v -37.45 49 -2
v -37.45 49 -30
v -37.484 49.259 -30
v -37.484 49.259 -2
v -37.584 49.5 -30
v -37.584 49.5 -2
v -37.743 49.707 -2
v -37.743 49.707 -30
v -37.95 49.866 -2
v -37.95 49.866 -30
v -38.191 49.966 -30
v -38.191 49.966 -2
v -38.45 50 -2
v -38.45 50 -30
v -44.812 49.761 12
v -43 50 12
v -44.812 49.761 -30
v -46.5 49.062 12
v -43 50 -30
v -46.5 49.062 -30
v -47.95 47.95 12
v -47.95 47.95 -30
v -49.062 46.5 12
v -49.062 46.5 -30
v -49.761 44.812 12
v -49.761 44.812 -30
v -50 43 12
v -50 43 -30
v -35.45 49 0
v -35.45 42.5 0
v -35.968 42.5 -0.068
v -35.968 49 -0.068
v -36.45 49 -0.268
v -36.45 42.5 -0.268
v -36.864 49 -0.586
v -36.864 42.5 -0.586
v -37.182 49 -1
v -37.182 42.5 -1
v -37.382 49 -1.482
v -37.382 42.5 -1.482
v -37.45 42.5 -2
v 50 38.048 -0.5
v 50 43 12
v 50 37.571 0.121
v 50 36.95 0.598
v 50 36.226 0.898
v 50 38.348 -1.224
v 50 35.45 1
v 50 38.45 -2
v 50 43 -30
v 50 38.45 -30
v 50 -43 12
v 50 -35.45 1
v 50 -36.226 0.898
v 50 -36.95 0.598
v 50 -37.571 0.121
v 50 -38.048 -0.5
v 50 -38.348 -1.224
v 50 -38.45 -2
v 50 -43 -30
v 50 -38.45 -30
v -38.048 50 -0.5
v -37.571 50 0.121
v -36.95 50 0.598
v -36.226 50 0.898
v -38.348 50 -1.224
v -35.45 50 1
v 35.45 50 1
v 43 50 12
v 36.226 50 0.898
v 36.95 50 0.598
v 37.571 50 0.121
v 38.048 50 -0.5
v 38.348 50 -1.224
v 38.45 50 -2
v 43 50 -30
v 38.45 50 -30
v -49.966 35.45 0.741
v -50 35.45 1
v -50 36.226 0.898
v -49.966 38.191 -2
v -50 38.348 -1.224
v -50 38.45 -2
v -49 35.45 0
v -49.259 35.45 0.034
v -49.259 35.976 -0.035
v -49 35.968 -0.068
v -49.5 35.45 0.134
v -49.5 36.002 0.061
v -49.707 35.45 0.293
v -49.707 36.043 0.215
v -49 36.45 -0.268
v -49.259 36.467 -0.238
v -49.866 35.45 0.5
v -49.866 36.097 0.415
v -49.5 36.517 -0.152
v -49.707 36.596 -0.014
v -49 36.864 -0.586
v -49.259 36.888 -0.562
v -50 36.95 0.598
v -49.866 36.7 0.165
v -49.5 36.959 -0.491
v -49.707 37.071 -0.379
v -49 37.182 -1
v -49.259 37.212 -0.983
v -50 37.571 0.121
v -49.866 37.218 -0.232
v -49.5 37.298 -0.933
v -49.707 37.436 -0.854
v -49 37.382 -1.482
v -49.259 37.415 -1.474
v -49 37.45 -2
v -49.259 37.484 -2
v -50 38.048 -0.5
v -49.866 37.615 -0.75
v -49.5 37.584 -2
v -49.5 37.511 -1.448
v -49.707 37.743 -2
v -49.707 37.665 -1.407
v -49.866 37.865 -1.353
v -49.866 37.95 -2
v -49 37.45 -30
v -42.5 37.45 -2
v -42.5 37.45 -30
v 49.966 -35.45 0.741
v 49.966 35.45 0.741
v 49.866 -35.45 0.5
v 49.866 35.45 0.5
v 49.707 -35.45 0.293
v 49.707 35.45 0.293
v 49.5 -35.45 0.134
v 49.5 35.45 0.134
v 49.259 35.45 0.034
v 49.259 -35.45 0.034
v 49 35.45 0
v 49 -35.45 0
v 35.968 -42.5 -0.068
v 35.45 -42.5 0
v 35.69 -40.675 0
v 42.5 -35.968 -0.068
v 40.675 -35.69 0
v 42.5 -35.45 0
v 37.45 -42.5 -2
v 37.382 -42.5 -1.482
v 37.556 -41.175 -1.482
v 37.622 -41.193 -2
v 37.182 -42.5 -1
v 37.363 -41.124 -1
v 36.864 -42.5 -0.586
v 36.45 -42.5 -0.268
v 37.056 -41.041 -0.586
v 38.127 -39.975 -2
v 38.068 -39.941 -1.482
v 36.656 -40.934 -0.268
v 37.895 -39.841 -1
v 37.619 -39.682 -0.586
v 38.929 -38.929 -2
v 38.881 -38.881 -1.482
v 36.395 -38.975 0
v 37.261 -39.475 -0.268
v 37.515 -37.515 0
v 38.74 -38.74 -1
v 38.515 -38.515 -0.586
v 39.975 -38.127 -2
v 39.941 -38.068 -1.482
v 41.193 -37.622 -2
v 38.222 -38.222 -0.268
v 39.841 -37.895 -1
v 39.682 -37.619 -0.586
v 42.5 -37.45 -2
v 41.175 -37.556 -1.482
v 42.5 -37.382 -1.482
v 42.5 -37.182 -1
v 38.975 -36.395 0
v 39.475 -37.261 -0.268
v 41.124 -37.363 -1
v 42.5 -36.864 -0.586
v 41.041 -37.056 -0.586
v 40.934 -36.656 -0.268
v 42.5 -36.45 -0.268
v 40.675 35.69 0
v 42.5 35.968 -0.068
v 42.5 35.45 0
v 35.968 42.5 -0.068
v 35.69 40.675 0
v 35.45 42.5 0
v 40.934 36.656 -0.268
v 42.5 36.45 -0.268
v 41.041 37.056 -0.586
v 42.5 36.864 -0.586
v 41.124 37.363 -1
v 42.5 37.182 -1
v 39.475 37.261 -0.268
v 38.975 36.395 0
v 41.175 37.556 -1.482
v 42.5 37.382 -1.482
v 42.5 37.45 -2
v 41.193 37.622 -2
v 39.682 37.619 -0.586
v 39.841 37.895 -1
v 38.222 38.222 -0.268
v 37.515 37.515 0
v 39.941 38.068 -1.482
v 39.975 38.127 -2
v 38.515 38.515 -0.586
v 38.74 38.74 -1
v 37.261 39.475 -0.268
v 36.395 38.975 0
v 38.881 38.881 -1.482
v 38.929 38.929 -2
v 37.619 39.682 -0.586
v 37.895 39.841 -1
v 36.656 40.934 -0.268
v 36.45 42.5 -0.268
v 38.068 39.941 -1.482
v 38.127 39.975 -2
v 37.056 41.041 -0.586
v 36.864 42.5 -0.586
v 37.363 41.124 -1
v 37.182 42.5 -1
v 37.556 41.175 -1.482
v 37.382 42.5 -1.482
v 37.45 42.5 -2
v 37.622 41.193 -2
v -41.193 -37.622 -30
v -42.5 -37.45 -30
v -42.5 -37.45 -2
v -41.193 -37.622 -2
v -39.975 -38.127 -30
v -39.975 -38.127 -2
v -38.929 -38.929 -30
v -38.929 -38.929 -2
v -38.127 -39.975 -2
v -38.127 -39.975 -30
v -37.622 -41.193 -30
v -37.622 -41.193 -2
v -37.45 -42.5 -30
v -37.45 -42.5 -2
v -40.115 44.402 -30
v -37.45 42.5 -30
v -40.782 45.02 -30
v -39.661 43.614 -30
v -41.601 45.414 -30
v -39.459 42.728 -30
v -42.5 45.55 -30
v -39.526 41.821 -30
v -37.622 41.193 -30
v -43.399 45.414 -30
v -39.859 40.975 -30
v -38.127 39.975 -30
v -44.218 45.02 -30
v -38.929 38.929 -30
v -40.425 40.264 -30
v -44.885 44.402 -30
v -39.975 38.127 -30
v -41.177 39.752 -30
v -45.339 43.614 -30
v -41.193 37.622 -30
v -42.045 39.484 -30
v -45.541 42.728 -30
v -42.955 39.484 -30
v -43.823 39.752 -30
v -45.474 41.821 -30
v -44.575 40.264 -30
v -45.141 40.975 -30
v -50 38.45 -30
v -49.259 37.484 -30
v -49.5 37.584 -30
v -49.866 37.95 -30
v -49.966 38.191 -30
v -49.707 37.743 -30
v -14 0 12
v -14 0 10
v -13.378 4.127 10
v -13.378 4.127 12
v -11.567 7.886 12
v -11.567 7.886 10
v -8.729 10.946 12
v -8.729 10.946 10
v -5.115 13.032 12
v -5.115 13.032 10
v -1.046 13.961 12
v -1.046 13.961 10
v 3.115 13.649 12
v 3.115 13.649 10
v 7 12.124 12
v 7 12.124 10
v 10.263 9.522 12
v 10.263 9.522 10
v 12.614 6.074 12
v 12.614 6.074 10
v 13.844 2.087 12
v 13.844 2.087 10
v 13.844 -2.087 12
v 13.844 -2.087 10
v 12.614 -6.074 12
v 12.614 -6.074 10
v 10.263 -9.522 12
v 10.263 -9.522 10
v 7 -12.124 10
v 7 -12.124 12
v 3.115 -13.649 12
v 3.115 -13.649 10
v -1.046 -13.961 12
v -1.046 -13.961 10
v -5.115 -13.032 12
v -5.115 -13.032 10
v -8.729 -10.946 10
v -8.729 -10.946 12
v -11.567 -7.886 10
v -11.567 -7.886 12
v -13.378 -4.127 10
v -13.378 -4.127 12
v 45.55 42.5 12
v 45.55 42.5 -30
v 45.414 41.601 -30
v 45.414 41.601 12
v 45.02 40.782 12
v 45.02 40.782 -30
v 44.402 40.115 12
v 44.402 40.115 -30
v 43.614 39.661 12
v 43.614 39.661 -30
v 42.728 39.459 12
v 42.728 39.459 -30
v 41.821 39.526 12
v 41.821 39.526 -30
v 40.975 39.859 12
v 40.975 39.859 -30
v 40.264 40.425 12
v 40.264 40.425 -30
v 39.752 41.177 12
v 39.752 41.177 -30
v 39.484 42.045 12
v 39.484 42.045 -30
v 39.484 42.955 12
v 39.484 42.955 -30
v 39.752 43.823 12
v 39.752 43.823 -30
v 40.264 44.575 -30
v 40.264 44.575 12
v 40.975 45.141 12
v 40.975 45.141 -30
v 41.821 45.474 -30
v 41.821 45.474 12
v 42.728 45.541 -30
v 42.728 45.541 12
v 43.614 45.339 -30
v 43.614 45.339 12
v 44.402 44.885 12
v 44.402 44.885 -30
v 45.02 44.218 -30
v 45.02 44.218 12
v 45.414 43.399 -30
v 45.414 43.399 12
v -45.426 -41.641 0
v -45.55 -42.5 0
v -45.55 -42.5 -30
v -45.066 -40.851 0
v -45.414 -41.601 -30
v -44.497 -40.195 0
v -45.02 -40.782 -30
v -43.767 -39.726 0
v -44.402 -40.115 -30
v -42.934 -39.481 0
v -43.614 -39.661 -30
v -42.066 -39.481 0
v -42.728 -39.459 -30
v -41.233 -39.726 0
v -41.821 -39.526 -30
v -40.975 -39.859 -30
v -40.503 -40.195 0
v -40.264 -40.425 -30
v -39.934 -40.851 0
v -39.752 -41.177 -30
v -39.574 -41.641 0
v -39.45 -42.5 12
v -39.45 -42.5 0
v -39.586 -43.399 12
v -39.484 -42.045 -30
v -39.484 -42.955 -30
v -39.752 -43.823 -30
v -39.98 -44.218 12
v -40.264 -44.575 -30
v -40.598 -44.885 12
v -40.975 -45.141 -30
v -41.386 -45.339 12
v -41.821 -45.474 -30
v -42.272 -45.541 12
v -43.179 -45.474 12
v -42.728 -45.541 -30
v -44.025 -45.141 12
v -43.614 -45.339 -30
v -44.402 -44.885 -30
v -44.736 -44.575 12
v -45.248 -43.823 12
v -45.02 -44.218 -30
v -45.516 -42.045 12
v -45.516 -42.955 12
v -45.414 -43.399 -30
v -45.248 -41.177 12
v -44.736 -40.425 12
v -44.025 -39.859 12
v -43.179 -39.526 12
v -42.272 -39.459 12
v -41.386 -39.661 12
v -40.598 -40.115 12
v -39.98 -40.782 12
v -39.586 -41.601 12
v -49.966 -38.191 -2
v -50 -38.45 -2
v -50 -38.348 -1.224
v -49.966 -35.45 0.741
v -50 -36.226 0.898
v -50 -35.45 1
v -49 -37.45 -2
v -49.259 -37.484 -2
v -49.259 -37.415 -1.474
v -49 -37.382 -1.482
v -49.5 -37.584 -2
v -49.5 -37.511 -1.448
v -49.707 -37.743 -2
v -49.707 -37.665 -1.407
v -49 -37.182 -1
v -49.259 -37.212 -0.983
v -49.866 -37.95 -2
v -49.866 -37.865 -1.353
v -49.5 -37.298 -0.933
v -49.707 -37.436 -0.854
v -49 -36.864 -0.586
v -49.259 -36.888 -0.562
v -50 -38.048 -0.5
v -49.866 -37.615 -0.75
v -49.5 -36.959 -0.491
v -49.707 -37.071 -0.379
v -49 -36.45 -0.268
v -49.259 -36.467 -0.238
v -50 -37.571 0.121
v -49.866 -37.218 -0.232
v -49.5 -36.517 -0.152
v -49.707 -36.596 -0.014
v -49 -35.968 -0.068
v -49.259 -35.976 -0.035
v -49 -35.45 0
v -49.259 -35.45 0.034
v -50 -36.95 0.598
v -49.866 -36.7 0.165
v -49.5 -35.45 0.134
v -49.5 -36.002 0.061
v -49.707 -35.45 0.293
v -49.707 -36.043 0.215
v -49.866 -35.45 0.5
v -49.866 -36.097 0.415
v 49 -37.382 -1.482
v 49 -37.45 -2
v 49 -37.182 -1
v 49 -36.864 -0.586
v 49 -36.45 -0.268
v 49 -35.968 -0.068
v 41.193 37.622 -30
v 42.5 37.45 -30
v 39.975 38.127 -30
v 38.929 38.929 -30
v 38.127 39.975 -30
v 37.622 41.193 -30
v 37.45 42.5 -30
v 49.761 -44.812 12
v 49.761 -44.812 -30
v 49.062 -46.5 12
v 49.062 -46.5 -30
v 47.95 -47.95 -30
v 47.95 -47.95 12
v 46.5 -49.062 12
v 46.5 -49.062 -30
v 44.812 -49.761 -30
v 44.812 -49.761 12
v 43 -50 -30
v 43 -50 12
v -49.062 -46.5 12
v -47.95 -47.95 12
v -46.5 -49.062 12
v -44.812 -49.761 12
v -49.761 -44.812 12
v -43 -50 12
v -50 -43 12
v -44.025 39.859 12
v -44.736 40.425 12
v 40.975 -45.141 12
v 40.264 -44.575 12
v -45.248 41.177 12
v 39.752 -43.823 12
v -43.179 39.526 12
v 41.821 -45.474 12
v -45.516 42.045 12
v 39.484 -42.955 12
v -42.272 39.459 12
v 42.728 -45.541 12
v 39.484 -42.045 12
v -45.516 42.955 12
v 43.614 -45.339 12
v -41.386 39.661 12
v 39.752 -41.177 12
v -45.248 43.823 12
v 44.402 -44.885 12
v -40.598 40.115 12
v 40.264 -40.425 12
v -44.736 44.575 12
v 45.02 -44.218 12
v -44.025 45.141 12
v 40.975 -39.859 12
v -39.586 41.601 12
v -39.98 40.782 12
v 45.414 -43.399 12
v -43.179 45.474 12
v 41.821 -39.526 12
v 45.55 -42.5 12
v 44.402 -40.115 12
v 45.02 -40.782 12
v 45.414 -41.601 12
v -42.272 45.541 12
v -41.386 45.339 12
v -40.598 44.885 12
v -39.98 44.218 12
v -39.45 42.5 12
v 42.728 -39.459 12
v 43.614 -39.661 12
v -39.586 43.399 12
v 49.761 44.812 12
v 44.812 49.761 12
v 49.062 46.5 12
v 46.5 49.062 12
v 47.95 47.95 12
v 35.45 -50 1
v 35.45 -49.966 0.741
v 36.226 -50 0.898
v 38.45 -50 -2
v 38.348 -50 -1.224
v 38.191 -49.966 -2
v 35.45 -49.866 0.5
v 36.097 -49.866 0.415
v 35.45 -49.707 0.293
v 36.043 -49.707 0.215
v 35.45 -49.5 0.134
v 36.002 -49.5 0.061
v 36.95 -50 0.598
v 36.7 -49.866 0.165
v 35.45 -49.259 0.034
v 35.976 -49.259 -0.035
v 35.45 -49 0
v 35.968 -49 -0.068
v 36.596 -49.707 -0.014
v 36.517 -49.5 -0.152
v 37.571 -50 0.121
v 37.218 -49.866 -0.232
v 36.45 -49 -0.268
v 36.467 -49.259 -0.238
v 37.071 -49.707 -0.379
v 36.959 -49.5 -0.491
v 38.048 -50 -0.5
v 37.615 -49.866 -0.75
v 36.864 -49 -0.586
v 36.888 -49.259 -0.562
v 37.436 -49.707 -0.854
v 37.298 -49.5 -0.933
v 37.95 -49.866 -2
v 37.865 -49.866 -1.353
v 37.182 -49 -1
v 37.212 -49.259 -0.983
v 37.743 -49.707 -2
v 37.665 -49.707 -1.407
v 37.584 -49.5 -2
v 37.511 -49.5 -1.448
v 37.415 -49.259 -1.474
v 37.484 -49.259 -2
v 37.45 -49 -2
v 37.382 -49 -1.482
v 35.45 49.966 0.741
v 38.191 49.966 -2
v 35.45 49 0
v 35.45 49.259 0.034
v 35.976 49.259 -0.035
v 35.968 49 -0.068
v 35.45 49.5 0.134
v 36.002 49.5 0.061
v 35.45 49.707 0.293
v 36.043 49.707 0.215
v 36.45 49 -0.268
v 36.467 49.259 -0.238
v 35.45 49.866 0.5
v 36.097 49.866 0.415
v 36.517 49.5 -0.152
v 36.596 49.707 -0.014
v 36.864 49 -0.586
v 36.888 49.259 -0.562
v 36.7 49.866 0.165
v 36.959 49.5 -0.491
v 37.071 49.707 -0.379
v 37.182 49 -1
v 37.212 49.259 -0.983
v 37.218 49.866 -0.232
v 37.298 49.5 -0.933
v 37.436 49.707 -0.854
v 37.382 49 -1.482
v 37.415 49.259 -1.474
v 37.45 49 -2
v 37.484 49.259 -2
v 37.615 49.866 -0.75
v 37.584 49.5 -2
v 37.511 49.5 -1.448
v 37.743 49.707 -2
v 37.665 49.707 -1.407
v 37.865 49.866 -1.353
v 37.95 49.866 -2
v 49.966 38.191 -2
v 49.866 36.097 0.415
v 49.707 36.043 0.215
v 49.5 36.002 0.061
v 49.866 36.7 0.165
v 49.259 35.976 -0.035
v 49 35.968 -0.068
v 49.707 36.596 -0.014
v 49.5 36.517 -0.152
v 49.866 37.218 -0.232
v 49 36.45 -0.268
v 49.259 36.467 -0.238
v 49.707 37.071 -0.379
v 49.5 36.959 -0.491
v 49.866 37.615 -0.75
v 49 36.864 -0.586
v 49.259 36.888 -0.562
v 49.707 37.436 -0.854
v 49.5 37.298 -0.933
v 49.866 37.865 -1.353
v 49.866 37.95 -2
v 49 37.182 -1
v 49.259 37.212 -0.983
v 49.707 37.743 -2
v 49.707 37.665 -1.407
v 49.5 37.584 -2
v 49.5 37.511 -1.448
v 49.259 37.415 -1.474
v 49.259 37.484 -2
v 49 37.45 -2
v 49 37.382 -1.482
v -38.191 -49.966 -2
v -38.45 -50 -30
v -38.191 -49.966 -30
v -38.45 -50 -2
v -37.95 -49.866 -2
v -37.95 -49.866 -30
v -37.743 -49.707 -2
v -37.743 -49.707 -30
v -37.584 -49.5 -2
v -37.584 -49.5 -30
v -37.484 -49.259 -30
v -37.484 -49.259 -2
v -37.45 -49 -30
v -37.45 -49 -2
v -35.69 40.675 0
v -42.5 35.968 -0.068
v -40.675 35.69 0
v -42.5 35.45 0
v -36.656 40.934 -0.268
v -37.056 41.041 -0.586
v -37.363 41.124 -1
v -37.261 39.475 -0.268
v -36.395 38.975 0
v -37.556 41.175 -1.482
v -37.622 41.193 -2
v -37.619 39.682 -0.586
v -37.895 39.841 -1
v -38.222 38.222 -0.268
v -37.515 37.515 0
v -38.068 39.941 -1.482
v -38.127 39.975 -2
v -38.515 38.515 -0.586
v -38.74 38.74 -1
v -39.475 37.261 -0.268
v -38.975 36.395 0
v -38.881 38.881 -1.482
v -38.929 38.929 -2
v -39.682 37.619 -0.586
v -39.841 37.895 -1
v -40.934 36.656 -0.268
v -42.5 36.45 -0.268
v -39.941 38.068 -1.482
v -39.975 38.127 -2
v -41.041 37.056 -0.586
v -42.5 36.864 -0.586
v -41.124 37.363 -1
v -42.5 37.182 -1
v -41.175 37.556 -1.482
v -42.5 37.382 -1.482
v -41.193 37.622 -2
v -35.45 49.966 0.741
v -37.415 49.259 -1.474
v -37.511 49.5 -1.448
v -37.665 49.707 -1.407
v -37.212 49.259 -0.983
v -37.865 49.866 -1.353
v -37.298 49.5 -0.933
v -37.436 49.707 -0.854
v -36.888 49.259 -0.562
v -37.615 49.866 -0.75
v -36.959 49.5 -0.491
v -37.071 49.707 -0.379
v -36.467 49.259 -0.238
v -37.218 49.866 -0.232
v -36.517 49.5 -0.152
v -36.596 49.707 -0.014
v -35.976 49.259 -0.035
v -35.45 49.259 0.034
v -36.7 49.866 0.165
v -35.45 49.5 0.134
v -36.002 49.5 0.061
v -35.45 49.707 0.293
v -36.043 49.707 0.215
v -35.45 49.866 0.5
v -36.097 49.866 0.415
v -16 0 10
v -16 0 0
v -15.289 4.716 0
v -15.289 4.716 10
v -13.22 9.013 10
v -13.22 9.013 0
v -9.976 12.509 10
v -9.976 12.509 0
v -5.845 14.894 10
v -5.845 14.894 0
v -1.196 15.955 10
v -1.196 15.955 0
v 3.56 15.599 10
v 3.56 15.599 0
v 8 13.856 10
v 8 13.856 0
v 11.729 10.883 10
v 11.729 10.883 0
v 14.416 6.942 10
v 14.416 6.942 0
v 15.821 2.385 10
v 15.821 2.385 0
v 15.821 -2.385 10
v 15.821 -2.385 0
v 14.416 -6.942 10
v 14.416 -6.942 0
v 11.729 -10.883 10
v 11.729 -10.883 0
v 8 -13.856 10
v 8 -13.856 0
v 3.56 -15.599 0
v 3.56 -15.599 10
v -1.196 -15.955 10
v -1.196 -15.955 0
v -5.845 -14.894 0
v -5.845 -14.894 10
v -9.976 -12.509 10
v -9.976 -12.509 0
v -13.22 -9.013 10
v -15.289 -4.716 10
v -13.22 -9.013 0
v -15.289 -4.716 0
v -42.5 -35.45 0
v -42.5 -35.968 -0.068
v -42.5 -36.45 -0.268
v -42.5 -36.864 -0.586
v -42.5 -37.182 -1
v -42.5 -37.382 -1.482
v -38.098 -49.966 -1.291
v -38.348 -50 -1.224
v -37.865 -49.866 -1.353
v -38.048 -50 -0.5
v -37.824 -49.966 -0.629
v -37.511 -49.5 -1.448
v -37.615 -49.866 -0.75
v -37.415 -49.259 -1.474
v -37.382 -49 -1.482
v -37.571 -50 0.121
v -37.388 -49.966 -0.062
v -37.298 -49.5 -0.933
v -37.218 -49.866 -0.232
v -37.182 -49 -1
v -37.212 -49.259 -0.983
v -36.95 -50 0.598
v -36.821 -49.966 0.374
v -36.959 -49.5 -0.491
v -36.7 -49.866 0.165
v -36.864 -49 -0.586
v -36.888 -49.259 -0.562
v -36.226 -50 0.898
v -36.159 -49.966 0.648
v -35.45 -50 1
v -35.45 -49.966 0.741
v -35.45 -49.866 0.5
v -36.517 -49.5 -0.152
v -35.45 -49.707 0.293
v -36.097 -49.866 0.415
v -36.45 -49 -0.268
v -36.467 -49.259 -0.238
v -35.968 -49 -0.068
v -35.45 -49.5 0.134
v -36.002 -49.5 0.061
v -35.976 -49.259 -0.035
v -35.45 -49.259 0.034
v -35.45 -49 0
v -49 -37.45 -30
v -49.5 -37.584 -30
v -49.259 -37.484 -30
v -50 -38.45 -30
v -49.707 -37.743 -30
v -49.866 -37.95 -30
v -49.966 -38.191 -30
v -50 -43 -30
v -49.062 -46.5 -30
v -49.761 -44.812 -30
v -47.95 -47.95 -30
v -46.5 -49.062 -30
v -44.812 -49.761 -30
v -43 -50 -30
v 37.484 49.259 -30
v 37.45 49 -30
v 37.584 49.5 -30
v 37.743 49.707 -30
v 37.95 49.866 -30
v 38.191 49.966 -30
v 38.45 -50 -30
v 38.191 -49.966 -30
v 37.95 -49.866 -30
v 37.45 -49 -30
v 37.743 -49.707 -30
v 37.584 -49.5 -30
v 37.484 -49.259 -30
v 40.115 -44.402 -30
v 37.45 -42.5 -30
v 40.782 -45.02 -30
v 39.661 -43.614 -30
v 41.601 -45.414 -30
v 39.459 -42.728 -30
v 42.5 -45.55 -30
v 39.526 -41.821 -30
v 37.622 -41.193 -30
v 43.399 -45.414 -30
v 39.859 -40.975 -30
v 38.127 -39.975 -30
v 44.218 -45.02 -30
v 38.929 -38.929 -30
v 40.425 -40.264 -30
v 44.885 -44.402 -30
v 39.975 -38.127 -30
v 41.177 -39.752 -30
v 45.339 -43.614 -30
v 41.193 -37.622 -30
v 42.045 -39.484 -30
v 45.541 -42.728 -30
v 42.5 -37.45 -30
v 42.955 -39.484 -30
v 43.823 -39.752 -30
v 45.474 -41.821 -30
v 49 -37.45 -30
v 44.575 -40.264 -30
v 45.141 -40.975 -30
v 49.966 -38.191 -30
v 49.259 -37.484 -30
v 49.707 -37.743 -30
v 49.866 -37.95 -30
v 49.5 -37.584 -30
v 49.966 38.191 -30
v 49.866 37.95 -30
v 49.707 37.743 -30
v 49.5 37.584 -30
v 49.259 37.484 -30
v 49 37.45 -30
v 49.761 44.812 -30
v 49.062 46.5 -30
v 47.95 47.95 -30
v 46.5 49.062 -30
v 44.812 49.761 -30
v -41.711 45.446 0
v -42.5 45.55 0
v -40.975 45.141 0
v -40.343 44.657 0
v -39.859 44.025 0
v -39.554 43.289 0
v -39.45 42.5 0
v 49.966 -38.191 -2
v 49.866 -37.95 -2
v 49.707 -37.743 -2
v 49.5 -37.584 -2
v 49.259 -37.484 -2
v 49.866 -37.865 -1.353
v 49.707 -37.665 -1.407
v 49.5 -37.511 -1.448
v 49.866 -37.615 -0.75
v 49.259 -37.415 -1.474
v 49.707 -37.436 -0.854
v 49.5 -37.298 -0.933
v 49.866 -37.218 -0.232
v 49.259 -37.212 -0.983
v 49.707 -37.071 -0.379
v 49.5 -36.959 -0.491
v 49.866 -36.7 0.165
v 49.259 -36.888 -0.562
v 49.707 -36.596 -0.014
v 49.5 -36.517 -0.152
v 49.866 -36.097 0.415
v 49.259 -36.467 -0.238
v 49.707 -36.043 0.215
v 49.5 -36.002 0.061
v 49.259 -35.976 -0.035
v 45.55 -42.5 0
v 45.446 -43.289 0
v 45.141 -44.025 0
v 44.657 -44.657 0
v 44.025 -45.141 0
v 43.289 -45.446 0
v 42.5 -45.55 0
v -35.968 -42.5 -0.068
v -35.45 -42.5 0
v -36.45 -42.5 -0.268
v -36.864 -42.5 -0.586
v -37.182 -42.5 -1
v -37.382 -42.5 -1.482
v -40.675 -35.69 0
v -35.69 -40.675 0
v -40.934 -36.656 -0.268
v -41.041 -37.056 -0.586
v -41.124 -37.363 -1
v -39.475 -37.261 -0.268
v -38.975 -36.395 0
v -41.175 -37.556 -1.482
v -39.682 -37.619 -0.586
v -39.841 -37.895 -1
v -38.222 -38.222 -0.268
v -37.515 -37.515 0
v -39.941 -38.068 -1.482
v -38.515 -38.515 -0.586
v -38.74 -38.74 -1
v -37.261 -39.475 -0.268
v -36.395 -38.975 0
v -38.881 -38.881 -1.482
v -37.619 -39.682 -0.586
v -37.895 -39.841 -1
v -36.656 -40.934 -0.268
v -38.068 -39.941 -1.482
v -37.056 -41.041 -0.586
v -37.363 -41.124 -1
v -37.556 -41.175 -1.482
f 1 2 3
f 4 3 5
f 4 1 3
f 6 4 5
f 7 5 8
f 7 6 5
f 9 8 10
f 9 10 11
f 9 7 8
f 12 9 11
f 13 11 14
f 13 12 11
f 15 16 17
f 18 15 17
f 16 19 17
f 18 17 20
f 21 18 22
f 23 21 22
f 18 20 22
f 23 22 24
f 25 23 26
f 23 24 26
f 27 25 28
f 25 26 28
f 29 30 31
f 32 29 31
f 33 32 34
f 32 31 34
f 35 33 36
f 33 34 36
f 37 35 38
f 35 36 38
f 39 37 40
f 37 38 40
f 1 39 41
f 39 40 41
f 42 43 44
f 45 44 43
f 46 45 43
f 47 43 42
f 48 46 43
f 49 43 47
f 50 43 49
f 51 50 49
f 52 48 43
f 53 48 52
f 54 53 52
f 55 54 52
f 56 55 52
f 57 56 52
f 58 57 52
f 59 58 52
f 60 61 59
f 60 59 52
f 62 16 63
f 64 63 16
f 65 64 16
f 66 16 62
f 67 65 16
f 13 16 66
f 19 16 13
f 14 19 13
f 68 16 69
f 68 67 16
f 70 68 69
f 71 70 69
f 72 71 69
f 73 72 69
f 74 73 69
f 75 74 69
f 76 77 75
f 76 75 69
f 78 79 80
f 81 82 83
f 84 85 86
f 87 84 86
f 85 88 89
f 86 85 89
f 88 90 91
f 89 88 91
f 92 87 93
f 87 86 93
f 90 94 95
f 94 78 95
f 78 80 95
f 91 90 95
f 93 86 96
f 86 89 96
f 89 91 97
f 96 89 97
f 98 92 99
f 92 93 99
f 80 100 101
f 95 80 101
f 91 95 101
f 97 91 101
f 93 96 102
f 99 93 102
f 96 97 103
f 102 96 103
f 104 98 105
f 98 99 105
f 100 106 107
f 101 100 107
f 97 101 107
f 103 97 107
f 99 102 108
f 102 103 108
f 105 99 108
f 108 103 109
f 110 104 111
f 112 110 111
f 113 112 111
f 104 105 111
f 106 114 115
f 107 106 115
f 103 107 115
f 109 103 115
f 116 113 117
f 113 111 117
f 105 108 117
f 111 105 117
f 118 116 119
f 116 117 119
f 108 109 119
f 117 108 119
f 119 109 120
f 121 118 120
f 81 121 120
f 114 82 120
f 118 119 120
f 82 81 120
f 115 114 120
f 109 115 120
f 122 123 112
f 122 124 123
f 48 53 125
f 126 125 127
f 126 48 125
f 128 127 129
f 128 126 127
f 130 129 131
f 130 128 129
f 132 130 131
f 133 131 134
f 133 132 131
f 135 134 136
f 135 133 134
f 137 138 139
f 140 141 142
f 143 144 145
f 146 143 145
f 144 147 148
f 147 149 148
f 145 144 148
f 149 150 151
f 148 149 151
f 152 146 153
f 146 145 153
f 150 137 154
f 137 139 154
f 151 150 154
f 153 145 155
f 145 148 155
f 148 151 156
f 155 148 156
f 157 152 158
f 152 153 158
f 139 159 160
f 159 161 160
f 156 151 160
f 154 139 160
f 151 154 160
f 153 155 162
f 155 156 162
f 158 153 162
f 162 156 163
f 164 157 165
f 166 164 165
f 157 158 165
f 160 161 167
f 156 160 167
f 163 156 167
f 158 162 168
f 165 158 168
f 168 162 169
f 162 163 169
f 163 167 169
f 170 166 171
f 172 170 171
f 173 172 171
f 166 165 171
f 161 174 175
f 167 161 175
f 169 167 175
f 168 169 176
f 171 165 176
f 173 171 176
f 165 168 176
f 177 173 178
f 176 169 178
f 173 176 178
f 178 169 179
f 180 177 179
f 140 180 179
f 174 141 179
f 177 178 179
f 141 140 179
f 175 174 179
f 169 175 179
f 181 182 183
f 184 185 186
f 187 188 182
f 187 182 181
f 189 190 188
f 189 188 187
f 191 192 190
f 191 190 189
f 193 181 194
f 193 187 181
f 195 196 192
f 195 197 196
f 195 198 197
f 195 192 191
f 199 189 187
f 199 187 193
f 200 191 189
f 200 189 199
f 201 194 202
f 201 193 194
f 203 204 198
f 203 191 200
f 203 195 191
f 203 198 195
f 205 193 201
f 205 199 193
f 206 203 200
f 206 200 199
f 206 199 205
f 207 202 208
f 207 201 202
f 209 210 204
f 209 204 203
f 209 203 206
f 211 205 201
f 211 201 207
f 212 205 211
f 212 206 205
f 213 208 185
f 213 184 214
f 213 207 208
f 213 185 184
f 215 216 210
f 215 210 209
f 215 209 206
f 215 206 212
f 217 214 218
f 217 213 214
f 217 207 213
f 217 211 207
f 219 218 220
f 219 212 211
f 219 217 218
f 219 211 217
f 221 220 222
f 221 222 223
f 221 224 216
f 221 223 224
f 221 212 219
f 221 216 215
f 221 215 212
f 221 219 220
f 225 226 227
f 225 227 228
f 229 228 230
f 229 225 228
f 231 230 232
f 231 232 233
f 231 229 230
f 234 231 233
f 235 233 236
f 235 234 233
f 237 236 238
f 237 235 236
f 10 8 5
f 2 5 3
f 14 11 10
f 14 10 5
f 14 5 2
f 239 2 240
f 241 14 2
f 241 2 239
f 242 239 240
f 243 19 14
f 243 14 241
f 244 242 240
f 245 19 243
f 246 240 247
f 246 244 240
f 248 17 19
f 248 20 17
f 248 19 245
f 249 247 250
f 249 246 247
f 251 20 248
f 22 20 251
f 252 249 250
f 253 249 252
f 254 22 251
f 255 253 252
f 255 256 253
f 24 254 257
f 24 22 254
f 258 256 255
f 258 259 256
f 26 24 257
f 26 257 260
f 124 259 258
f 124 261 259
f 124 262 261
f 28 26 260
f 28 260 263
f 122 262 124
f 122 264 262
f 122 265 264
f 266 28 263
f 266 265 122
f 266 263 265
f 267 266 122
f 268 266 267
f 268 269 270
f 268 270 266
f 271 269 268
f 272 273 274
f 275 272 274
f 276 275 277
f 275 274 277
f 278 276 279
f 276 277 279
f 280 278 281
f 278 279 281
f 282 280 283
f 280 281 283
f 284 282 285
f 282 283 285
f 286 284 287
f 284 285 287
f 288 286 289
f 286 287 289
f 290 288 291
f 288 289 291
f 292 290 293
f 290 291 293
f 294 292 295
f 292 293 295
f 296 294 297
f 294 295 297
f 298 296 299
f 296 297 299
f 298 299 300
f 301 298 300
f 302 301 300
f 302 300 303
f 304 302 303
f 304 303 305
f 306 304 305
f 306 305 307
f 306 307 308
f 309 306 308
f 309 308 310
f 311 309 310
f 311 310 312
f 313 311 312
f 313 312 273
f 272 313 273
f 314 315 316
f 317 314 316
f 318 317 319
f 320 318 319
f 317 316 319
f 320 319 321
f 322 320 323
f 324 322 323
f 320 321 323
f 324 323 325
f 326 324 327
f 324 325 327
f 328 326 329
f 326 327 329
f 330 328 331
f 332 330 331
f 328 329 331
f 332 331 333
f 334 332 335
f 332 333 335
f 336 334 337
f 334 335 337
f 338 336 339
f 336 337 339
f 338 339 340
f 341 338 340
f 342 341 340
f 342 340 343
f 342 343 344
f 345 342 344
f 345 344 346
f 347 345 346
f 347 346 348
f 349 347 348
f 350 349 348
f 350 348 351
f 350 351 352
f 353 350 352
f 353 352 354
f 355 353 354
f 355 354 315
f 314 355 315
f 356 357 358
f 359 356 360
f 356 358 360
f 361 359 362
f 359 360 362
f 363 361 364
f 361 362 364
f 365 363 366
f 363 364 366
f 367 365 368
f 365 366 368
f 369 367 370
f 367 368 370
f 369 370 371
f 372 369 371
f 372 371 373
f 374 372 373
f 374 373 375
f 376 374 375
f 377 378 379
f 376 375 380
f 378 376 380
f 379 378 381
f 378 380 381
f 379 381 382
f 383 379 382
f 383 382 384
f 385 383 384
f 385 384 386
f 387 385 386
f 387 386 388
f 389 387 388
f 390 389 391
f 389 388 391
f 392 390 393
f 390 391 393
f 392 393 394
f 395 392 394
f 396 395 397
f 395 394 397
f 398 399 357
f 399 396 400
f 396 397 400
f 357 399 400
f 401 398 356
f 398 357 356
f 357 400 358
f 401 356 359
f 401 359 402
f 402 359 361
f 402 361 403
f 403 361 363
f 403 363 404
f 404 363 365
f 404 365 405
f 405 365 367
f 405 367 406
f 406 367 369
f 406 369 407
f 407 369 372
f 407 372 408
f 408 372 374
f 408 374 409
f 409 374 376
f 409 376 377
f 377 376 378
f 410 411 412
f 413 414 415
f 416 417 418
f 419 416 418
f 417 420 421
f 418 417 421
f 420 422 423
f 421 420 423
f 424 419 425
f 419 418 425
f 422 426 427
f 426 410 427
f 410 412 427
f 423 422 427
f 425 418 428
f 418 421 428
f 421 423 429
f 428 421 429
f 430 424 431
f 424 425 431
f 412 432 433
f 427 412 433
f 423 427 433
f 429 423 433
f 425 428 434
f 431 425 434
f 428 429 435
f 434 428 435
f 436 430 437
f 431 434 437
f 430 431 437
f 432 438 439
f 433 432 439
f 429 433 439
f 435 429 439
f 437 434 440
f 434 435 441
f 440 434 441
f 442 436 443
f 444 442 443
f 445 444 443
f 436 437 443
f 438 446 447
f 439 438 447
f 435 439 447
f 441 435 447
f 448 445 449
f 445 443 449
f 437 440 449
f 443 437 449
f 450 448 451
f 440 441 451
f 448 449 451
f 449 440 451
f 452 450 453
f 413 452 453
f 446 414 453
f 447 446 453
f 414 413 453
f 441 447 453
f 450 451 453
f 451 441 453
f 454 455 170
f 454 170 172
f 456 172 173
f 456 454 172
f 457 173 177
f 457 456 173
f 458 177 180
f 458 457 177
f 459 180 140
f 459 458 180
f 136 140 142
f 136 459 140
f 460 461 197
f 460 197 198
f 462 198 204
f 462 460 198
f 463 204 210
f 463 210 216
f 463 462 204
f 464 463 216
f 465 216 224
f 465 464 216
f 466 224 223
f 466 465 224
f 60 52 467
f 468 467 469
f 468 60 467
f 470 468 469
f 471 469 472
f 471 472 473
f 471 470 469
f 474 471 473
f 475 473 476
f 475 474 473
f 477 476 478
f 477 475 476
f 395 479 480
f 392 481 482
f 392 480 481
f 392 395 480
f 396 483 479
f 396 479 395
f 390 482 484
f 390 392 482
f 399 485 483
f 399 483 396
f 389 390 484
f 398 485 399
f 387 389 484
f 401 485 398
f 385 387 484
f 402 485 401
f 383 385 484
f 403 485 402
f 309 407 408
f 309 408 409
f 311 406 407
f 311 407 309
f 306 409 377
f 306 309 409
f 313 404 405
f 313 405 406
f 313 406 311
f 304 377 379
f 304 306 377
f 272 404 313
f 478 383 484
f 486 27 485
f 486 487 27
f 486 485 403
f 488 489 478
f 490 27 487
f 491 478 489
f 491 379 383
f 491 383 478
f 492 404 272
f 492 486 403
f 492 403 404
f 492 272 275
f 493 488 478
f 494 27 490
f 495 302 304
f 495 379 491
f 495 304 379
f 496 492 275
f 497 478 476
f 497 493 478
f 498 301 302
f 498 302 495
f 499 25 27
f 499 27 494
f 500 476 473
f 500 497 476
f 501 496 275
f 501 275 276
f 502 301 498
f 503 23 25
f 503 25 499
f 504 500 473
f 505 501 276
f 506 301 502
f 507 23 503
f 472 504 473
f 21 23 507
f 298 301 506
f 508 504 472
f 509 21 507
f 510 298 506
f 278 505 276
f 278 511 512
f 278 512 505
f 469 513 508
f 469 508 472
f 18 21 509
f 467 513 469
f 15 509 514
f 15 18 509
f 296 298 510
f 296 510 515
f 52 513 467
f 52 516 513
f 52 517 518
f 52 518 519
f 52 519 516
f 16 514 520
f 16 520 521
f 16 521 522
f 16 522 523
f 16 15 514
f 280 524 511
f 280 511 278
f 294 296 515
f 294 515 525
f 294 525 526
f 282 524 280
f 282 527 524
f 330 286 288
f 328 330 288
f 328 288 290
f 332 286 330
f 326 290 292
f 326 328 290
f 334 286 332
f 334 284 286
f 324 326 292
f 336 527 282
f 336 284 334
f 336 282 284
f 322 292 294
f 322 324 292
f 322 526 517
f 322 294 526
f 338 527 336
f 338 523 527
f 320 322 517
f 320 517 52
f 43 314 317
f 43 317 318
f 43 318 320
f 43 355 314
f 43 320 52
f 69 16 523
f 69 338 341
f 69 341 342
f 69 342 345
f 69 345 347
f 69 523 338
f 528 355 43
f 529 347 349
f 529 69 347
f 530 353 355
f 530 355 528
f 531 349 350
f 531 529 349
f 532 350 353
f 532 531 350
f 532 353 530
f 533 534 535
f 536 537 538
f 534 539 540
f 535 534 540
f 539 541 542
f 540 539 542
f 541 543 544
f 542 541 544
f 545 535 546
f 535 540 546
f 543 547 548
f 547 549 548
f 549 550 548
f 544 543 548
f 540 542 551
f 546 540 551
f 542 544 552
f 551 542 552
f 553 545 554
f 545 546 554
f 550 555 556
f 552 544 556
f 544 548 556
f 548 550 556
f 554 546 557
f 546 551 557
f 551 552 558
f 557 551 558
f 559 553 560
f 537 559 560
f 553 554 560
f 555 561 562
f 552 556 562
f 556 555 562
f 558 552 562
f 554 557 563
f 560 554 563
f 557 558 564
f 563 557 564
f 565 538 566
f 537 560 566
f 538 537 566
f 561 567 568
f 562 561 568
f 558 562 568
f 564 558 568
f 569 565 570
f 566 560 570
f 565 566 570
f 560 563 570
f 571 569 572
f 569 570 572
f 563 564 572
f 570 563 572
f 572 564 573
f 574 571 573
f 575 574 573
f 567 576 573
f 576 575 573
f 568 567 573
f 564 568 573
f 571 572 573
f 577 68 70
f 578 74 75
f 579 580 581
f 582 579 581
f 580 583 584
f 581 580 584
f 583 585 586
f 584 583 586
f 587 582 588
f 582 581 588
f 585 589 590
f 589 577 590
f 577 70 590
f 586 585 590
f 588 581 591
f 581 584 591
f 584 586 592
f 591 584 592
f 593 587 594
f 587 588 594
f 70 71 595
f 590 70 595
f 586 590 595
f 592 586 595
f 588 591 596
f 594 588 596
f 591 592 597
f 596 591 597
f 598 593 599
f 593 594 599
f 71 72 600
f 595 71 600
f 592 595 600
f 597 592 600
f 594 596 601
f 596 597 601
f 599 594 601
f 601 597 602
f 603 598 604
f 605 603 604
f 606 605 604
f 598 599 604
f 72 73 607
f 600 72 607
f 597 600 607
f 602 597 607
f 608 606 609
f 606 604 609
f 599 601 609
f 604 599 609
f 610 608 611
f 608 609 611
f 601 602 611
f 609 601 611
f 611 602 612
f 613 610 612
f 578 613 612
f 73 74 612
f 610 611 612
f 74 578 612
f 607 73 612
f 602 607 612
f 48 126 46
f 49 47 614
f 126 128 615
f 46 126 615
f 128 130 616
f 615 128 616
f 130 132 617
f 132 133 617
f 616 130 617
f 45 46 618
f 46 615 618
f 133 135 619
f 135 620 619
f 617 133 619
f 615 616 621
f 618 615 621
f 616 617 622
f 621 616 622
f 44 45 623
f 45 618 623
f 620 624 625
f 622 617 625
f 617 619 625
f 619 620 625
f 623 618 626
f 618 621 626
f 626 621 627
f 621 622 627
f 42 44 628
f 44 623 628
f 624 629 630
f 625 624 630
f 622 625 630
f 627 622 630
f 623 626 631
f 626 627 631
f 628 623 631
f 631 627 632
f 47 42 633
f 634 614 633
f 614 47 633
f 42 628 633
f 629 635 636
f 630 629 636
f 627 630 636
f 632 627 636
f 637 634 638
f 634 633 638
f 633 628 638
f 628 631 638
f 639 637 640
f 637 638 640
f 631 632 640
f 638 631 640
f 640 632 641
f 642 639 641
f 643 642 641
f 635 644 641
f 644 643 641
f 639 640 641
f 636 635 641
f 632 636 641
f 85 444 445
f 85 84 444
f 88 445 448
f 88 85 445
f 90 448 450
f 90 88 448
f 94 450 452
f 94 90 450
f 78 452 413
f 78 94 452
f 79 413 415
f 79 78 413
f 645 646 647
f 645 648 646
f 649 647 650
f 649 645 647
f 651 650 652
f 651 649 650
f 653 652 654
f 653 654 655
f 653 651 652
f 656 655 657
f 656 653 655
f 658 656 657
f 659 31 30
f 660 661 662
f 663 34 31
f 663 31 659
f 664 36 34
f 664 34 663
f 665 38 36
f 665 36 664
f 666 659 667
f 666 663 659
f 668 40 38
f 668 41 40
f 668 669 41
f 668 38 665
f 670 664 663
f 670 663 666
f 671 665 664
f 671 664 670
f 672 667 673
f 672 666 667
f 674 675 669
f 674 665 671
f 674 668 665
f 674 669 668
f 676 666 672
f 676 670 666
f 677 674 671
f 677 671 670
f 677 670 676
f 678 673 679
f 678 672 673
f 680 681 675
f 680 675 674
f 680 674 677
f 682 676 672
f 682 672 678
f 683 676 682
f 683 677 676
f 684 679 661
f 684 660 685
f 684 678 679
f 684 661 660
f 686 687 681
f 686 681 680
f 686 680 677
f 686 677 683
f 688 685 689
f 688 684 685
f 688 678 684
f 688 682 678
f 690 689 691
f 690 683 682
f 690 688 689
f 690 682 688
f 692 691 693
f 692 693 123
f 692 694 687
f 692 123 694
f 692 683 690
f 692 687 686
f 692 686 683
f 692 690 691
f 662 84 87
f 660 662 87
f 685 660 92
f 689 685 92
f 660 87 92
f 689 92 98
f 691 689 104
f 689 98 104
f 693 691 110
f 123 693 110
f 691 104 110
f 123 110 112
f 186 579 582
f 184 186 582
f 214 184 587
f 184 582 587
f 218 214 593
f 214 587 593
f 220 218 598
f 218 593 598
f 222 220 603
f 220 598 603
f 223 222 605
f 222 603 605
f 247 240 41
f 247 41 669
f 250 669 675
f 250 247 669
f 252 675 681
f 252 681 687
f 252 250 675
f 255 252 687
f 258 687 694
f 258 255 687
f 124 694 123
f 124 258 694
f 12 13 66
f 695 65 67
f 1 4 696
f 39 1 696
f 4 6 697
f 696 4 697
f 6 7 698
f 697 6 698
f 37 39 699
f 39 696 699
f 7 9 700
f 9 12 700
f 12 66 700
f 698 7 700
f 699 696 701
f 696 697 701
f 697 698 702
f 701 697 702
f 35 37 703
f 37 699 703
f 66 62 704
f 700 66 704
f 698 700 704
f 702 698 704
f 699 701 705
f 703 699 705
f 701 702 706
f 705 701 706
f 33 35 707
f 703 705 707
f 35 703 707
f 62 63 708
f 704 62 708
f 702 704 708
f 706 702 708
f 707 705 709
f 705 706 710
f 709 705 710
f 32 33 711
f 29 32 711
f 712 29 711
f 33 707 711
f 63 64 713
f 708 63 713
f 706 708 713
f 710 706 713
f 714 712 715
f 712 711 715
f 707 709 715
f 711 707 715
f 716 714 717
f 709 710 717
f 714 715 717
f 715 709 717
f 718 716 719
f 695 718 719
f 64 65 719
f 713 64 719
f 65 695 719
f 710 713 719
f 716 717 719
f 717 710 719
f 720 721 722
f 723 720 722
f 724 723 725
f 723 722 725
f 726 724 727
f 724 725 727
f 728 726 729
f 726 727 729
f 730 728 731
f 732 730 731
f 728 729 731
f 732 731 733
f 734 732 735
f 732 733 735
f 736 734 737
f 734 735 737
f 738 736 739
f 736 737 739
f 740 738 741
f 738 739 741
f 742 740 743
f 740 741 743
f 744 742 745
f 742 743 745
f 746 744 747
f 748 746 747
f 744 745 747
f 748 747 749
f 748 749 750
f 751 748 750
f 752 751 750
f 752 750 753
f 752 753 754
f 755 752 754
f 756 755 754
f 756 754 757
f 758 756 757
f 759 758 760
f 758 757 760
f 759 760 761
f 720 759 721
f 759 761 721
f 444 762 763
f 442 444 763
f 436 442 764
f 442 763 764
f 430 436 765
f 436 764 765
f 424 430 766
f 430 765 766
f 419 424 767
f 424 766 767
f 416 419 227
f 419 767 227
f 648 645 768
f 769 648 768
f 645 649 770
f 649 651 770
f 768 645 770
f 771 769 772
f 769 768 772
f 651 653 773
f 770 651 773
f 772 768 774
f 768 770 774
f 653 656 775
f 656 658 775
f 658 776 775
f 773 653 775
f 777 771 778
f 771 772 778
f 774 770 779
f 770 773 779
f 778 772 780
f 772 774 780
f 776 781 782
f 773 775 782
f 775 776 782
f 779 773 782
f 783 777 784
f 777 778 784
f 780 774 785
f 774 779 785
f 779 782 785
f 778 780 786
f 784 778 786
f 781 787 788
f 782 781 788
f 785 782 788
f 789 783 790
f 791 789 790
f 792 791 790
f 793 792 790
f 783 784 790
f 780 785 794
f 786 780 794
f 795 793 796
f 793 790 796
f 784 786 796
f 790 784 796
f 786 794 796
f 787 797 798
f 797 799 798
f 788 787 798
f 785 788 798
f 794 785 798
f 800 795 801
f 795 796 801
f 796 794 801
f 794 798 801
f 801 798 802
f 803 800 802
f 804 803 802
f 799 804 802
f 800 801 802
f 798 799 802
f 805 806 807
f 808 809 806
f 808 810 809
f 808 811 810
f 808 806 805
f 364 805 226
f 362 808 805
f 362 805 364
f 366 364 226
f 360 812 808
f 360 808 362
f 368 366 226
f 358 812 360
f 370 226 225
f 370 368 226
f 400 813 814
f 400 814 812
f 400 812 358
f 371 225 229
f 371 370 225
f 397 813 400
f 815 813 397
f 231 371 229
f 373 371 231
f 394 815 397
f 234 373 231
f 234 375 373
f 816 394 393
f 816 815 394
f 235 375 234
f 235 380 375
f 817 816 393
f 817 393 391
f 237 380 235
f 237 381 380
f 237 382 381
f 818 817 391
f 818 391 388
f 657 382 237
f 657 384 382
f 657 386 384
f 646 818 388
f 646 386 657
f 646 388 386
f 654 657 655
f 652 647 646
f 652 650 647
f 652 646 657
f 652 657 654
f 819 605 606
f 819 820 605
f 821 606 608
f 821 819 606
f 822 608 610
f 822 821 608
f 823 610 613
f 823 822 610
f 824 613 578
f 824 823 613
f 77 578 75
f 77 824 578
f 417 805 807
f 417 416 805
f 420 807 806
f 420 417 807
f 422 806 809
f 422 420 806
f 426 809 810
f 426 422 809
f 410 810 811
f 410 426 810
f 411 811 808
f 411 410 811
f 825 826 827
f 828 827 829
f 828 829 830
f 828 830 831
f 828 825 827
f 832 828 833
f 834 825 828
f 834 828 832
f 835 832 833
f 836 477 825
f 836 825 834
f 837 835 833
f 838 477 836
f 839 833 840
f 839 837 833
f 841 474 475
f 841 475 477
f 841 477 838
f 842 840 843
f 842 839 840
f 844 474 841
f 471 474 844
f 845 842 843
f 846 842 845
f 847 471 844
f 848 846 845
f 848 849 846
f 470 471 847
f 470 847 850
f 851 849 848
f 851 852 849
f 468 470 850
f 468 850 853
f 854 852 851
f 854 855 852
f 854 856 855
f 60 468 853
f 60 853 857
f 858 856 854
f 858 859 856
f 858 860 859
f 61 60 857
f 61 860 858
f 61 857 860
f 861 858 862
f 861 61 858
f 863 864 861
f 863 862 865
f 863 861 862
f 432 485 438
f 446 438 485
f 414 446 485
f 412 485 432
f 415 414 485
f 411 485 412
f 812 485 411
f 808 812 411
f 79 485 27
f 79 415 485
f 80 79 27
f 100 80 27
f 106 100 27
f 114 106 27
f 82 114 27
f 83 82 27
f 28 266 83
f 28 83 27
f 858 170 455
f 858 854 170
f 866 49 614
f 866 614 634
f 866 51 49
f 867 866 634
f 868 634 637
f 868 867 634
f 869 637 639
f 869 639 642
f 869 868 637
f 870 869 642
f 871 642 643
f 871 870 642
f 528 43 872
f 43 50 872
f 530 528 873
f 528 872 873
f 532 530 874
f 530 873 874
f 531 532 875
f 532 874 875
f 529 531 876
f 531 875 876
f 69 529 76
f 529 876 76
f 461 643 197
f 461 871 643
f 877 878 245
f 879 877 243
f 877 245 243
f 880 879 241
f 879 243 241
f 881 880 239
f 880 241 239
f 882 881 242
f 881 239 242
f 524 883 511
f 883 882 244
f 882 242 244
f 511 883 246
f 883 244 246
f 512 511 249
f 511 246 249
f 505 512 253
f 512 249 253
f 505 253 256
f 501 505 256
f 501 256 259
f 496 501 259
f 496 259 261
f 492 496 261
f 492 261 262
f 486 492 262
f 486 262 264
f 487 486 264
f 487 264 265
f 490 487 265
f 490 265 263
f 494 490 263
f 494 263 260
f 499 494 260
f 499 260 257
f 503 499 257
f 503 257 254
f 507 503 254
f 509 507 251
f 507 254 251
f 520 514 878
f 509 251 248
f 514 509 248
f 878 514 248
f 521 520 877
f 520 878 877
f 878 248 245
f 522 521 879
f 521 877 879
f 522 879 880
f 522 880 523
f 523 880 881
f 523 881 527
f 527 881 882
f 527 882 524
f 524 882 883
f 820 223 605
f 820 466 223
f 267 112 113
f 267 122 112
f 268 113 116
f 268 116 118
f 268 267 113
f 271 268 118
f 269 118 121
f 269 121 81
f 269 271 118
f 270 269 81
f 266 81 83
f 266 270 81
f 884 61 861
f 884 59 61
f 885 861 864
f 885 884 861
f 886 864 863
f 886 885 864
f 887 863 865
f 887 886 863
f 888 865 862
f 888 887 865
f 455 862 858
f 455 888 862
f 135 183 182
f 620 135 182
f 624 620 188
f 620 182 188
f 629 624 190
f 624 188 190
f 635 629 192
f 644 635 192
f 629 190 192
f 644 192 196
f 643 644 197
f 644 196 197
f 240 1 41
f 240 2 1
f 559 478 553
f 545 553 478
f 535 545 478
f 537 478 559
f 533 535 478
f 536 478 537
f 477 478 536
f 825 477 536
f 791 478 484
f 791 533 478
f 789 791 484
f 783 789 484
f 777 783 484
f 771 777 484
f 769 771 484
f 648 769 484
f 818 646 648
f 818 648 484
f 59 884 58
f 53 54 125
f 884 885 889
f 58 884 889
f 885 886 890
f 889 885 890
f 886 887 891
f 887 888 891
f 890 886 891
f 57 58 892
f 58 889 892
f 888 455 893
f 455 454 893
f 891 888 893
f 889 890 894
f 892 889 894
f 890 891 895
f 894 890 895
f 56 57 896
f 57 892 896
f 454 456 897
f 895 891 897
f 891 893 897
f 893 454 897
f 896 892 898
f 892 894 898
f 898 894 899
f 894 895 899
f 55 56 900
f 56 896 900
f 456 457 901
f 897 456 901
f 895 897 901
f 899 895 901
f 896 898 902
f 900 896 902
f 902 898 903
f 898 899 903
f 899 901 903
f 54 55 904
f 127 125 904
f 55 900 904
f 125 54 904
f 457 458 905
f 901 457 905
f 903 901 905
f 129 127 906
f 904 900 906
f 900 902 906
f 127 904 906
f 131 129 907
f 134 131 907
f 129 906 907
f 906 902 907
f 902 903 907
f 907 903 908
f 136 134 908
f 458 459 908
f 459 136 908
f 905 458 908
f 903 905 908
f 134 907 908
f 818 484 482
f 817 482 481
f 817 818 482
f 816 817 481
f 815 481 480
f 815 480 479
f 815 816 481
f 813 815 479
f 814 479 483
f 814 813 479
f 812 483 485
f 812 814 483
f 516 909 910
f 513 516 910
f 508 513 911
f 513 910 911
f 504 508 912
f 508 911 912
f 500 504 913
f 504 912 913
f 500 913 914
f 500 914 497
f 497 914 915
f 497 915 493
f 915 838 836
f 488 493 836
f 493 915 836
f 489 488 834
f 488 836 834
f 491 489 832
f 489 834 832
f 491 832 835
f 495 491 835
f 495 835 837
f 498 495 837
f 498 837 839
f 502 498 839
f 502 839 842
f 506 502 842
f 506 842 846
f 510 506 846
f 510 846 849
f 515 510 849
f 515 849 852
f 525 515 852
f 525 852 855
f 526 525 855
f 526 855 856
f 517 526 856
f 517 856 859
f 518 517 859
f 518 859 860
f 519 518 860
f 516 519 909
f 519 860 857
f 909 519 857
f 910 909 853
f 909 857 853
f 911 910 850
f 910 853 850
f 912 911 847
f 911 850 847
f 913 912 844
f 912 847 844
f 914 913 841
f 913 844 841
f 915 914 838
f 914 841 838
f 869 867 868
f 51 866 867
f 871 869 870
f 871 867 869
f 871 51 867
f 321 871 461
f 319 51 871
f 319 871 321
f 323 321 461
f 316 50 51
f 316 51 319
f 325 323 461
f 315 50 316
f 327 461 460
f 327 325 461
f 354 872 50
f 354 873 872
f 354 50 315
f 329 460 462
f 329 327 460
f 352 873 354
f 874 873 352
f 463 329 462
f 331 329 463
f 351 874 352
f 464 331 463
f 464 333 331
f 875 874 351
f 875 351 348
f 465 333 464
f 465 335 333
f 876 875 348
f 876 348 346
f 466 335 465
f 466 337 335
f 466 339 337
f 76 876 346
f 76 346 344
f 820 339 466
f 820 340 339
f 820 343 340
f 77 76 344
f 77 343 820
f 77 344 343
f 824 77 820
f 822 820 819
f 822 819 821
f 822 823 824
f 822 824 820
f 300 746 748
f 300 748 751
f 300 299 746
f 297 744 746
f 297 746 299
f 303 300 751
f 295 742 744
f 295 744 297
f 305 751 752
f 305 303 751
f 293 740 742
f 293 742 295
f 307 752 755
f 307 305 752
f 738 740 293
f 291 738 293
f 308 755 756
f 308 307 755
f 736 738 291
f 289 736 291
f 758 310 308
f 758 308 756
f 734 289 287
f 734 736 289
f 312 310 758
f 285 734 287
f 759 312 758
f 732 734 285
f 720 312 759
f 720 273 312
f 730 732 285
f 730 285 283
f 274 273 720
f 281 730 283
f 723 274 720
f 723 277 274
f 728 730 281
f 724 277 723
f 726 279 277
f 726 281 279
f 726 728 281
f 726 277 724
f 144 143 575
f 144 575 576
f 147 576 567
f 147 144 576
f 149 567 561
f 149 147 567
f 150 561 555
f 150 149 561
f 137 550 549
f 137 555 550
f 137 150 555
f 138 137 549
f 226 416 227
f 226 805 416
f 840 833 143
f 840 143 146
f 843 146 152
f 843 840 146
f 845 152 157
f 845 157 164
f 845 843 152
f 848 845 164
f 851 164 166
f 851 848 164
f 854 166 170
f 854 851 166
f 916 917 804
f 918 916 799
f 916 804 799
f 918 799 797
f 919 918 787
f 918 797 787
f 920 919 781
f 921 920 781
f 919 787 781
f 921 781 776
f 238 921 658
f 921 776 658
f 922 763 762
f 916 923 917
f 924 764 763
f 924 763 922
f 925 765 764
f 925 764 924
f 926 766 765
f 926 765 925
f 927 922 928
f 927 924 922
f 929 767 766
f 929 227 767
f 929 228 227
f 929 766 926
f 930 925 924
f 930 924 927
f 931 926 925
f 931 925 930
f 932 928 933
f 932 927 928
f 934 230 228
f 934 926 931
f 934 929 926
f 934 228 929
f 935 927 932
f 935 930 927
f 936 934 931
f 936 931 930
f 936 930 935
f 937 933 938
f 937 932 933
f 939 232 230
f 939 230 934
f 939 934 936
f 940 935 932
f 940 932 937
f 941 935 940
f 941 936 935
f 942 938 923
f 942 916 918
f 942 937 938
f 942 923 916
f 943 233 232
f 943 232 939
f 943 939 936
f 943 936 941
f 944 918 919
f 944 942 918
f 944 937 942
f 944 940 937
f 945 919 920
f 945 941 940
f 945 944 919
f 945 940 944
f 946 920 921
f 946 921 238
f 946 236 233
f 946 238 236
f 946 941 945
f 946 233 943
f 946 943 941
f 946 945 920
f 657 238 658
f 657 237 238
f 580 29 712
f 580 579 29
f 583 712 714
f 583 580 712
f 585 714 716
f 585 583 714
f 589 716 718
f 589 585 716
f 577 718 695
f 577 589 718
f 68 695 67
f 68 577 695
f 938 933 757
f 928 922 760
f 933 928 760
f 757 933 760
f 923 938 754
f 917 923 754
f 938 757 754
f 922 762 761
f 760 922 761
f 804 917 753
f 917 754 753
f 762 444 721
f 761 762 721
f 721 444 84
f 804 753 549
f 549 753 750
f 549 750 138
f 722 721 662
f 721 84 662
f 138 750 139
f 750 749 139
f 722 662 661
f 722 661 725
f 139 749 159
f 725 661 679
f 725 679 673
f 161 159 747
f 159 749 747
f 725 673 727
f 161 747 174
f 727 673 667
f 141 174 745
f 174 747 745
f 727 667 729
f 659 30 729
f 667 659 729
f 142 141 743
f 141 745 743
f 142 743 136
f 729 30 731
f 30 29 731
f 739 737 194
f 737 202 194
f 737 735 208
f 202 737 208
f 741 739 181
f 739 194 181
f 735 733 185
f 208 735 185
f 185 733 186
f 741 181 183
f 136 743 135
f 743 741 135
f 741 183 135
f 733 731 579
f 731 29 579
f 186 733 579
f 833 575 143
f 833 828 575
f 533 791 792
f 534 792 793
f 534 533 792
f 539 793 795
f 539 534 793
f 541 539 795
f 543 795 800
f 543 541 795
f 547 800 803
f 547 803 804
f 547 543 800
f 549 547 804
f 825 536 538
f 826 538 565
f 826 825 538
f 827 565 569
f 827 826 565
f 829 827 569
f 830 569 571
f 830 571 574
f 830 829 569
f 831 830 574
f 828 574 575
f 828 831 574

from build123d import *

# Parameters (mm, degrees)
SKETCH2_W            = 100
SKETCH2_H            = 100
BOSS_EXTRUDE1_DEPTH  = 12
SKETCH3_R            = 16
CUT_EXTRUDE1_DEPTH   = 10
M6_CLEARANCE_HOLE1_D = 6.1
BOSS_EXTRUDE2_START  = 30
SKETCH17_R           = 3.05
BOSS_EXTRUDE2_DEPTH  = 30
CIRPATTERN1_COUNT    = 4
SKETCH18_R           = 14
CUT_EXTRUDE3_DEPTH   = 77.811457479
FILLET1_R            = 2
FILLET2_R            = 7
FILLET3_R            = 1


with BuildPart() as part:
    # Sketch2 → Boss-Extrude1 (new body)
    with BuildSketch(Plane.XY):
        Rectangle(SKETCH2_W, SKETCH2_H)
    extrude(amount=BOSS_EXTRUDE1_DEPTH)

    # Sketch3 → Cut-Extrude1 (cut)
    with BuildSketch(Plane(origin=(0, 0, 0), x_dir=(-1, 0, 0), z_dir=(0, 0, -1))):
        Circle(SKETCH3_R)
    extrude(amount=-CUT_EXTRUDE1_DEPTH, mode=Mode.SUBTRACT)

    # M6 Clearance Hole1 (through all)
    with Locations(Plane(origin=(0, 0, 12), x_dir=(-1, 0, 0), z_dir=(0, 0, 1))):
        with Locations((42.5, -42.5), (-42.5, 42.5), (-42.5, -42.5), (42.5, 42.5)):
            Hole(M6_CLEARANCE_HOLE1_D / 2)

    # Sketch17 → Boss-Extrude2 (add)
    with BuildSketch(Plane(origin=(0, 0, 0), x_dir=(-1, 0, 0), z_dir=(0, 0, -1)).offset(BOSS_EXTRUDE2_START)):
        with BuildLine():
            Line((-37.45, 42.5), (-37.45, 50))
            Line((-37.45, 50), (-50, 50))
            Line((-50, 50), (-50, 37.45))
            Line((-50, 37.45), (-42.5, 37.45))
            ThreePointArc((-42.5, 37.45), (-38.929110755, 38.929110755), (-37.45, 42.5))
        make_face()
        with Locations((-42.5, 42.5)):
            Circle(SKETCH17_R, mode=Mode.SUBTRACT)
    boss_extrude2 = extrude(amount=-BOSS_EXTRUDE2_DEPTH)

    # CirPattern1: Boss-Extrude2 ×4 about axis
    cirpattern1_axis = Axis((0, 0, -0.635), (0, 0, 1))
    for i in range(1, CIRPATTERN1_COUNT):
        add(boss_extrude2.rotate(cirpattern1_axis, i * 360 / CIRPATTERN1_COUNT))

    # Sketch18 → Cut-Extrude3 (cut, through all)
    with BuildSketch(Plane(origin=(0, 0, 0), x_dir=(-1, 0, 0), z_dir=(0, 0, -1))):
        Circle(SKETCH18_R)
    extrude(amount=-CUT_EXTRUDE3_DEPTH, mode=Mode.SUBTRACT)

    # Fillet1
    fillet1_edges = [part.edges().sort_by_distance(p)[0] for p in [
        (38.929110755, 38.929110755, 0),
        (-38.929110755, 38.929110755, 0),
        (-38.929110755, -38.929110755, 0),
        (38.929110755, -38.929110755, 0),
        (-37.45, 46.25, 0),
        (-46.25, 37.45, 0),
        (-46.25, -37.45, 0),
        (-37.45, -46.25, 0),
        (37.45, -46.25, 0),
        (46.25, -37.45, 0),
        (46.25, 37.45, 0),
        (37.45, 46.25, 0),
    ]]
    fillet(fillet1_edges, radius=FILLET1_R)

    # Fillet2
    fillet2_edges = [part.edges().sort_by_distance(p)[0] for p in [
        (-50, -50, -9),
        (50, -50, -9),
        (50, 50, -9),
        (-50, 50, -9),
    ]]
    fillet(fillet2_edges, radius=FILLET2_R)

    # Fillet3
    fillet3_edges = [part.edges().sort_by_distance(p)[0] for p in [
        (-36.864213562, -50, -0.585786438),
        (36.864213562, -50, -0.585786438),
        (-50, 36.864213562, -0.585786438),
        (-50, -36.864213562, -0.585786438),
        (-36.864213562, 50, -0.585786438),
        (0, 50, 0),
        (36.864213562, 50, -0.585786438),
        (50, -36.864213562, -0.585786438),
        (50, 0, 0),
        (50, 36.864213562, -0.585786438),
        (0, -50, 0),
        (-50, 0, 0),
        (37.45, 50, -16),
        (50, 37.45, -16),
    ]]
    fillet(fillet3_edges, radius=FILLET3_R)


solid = part.part
